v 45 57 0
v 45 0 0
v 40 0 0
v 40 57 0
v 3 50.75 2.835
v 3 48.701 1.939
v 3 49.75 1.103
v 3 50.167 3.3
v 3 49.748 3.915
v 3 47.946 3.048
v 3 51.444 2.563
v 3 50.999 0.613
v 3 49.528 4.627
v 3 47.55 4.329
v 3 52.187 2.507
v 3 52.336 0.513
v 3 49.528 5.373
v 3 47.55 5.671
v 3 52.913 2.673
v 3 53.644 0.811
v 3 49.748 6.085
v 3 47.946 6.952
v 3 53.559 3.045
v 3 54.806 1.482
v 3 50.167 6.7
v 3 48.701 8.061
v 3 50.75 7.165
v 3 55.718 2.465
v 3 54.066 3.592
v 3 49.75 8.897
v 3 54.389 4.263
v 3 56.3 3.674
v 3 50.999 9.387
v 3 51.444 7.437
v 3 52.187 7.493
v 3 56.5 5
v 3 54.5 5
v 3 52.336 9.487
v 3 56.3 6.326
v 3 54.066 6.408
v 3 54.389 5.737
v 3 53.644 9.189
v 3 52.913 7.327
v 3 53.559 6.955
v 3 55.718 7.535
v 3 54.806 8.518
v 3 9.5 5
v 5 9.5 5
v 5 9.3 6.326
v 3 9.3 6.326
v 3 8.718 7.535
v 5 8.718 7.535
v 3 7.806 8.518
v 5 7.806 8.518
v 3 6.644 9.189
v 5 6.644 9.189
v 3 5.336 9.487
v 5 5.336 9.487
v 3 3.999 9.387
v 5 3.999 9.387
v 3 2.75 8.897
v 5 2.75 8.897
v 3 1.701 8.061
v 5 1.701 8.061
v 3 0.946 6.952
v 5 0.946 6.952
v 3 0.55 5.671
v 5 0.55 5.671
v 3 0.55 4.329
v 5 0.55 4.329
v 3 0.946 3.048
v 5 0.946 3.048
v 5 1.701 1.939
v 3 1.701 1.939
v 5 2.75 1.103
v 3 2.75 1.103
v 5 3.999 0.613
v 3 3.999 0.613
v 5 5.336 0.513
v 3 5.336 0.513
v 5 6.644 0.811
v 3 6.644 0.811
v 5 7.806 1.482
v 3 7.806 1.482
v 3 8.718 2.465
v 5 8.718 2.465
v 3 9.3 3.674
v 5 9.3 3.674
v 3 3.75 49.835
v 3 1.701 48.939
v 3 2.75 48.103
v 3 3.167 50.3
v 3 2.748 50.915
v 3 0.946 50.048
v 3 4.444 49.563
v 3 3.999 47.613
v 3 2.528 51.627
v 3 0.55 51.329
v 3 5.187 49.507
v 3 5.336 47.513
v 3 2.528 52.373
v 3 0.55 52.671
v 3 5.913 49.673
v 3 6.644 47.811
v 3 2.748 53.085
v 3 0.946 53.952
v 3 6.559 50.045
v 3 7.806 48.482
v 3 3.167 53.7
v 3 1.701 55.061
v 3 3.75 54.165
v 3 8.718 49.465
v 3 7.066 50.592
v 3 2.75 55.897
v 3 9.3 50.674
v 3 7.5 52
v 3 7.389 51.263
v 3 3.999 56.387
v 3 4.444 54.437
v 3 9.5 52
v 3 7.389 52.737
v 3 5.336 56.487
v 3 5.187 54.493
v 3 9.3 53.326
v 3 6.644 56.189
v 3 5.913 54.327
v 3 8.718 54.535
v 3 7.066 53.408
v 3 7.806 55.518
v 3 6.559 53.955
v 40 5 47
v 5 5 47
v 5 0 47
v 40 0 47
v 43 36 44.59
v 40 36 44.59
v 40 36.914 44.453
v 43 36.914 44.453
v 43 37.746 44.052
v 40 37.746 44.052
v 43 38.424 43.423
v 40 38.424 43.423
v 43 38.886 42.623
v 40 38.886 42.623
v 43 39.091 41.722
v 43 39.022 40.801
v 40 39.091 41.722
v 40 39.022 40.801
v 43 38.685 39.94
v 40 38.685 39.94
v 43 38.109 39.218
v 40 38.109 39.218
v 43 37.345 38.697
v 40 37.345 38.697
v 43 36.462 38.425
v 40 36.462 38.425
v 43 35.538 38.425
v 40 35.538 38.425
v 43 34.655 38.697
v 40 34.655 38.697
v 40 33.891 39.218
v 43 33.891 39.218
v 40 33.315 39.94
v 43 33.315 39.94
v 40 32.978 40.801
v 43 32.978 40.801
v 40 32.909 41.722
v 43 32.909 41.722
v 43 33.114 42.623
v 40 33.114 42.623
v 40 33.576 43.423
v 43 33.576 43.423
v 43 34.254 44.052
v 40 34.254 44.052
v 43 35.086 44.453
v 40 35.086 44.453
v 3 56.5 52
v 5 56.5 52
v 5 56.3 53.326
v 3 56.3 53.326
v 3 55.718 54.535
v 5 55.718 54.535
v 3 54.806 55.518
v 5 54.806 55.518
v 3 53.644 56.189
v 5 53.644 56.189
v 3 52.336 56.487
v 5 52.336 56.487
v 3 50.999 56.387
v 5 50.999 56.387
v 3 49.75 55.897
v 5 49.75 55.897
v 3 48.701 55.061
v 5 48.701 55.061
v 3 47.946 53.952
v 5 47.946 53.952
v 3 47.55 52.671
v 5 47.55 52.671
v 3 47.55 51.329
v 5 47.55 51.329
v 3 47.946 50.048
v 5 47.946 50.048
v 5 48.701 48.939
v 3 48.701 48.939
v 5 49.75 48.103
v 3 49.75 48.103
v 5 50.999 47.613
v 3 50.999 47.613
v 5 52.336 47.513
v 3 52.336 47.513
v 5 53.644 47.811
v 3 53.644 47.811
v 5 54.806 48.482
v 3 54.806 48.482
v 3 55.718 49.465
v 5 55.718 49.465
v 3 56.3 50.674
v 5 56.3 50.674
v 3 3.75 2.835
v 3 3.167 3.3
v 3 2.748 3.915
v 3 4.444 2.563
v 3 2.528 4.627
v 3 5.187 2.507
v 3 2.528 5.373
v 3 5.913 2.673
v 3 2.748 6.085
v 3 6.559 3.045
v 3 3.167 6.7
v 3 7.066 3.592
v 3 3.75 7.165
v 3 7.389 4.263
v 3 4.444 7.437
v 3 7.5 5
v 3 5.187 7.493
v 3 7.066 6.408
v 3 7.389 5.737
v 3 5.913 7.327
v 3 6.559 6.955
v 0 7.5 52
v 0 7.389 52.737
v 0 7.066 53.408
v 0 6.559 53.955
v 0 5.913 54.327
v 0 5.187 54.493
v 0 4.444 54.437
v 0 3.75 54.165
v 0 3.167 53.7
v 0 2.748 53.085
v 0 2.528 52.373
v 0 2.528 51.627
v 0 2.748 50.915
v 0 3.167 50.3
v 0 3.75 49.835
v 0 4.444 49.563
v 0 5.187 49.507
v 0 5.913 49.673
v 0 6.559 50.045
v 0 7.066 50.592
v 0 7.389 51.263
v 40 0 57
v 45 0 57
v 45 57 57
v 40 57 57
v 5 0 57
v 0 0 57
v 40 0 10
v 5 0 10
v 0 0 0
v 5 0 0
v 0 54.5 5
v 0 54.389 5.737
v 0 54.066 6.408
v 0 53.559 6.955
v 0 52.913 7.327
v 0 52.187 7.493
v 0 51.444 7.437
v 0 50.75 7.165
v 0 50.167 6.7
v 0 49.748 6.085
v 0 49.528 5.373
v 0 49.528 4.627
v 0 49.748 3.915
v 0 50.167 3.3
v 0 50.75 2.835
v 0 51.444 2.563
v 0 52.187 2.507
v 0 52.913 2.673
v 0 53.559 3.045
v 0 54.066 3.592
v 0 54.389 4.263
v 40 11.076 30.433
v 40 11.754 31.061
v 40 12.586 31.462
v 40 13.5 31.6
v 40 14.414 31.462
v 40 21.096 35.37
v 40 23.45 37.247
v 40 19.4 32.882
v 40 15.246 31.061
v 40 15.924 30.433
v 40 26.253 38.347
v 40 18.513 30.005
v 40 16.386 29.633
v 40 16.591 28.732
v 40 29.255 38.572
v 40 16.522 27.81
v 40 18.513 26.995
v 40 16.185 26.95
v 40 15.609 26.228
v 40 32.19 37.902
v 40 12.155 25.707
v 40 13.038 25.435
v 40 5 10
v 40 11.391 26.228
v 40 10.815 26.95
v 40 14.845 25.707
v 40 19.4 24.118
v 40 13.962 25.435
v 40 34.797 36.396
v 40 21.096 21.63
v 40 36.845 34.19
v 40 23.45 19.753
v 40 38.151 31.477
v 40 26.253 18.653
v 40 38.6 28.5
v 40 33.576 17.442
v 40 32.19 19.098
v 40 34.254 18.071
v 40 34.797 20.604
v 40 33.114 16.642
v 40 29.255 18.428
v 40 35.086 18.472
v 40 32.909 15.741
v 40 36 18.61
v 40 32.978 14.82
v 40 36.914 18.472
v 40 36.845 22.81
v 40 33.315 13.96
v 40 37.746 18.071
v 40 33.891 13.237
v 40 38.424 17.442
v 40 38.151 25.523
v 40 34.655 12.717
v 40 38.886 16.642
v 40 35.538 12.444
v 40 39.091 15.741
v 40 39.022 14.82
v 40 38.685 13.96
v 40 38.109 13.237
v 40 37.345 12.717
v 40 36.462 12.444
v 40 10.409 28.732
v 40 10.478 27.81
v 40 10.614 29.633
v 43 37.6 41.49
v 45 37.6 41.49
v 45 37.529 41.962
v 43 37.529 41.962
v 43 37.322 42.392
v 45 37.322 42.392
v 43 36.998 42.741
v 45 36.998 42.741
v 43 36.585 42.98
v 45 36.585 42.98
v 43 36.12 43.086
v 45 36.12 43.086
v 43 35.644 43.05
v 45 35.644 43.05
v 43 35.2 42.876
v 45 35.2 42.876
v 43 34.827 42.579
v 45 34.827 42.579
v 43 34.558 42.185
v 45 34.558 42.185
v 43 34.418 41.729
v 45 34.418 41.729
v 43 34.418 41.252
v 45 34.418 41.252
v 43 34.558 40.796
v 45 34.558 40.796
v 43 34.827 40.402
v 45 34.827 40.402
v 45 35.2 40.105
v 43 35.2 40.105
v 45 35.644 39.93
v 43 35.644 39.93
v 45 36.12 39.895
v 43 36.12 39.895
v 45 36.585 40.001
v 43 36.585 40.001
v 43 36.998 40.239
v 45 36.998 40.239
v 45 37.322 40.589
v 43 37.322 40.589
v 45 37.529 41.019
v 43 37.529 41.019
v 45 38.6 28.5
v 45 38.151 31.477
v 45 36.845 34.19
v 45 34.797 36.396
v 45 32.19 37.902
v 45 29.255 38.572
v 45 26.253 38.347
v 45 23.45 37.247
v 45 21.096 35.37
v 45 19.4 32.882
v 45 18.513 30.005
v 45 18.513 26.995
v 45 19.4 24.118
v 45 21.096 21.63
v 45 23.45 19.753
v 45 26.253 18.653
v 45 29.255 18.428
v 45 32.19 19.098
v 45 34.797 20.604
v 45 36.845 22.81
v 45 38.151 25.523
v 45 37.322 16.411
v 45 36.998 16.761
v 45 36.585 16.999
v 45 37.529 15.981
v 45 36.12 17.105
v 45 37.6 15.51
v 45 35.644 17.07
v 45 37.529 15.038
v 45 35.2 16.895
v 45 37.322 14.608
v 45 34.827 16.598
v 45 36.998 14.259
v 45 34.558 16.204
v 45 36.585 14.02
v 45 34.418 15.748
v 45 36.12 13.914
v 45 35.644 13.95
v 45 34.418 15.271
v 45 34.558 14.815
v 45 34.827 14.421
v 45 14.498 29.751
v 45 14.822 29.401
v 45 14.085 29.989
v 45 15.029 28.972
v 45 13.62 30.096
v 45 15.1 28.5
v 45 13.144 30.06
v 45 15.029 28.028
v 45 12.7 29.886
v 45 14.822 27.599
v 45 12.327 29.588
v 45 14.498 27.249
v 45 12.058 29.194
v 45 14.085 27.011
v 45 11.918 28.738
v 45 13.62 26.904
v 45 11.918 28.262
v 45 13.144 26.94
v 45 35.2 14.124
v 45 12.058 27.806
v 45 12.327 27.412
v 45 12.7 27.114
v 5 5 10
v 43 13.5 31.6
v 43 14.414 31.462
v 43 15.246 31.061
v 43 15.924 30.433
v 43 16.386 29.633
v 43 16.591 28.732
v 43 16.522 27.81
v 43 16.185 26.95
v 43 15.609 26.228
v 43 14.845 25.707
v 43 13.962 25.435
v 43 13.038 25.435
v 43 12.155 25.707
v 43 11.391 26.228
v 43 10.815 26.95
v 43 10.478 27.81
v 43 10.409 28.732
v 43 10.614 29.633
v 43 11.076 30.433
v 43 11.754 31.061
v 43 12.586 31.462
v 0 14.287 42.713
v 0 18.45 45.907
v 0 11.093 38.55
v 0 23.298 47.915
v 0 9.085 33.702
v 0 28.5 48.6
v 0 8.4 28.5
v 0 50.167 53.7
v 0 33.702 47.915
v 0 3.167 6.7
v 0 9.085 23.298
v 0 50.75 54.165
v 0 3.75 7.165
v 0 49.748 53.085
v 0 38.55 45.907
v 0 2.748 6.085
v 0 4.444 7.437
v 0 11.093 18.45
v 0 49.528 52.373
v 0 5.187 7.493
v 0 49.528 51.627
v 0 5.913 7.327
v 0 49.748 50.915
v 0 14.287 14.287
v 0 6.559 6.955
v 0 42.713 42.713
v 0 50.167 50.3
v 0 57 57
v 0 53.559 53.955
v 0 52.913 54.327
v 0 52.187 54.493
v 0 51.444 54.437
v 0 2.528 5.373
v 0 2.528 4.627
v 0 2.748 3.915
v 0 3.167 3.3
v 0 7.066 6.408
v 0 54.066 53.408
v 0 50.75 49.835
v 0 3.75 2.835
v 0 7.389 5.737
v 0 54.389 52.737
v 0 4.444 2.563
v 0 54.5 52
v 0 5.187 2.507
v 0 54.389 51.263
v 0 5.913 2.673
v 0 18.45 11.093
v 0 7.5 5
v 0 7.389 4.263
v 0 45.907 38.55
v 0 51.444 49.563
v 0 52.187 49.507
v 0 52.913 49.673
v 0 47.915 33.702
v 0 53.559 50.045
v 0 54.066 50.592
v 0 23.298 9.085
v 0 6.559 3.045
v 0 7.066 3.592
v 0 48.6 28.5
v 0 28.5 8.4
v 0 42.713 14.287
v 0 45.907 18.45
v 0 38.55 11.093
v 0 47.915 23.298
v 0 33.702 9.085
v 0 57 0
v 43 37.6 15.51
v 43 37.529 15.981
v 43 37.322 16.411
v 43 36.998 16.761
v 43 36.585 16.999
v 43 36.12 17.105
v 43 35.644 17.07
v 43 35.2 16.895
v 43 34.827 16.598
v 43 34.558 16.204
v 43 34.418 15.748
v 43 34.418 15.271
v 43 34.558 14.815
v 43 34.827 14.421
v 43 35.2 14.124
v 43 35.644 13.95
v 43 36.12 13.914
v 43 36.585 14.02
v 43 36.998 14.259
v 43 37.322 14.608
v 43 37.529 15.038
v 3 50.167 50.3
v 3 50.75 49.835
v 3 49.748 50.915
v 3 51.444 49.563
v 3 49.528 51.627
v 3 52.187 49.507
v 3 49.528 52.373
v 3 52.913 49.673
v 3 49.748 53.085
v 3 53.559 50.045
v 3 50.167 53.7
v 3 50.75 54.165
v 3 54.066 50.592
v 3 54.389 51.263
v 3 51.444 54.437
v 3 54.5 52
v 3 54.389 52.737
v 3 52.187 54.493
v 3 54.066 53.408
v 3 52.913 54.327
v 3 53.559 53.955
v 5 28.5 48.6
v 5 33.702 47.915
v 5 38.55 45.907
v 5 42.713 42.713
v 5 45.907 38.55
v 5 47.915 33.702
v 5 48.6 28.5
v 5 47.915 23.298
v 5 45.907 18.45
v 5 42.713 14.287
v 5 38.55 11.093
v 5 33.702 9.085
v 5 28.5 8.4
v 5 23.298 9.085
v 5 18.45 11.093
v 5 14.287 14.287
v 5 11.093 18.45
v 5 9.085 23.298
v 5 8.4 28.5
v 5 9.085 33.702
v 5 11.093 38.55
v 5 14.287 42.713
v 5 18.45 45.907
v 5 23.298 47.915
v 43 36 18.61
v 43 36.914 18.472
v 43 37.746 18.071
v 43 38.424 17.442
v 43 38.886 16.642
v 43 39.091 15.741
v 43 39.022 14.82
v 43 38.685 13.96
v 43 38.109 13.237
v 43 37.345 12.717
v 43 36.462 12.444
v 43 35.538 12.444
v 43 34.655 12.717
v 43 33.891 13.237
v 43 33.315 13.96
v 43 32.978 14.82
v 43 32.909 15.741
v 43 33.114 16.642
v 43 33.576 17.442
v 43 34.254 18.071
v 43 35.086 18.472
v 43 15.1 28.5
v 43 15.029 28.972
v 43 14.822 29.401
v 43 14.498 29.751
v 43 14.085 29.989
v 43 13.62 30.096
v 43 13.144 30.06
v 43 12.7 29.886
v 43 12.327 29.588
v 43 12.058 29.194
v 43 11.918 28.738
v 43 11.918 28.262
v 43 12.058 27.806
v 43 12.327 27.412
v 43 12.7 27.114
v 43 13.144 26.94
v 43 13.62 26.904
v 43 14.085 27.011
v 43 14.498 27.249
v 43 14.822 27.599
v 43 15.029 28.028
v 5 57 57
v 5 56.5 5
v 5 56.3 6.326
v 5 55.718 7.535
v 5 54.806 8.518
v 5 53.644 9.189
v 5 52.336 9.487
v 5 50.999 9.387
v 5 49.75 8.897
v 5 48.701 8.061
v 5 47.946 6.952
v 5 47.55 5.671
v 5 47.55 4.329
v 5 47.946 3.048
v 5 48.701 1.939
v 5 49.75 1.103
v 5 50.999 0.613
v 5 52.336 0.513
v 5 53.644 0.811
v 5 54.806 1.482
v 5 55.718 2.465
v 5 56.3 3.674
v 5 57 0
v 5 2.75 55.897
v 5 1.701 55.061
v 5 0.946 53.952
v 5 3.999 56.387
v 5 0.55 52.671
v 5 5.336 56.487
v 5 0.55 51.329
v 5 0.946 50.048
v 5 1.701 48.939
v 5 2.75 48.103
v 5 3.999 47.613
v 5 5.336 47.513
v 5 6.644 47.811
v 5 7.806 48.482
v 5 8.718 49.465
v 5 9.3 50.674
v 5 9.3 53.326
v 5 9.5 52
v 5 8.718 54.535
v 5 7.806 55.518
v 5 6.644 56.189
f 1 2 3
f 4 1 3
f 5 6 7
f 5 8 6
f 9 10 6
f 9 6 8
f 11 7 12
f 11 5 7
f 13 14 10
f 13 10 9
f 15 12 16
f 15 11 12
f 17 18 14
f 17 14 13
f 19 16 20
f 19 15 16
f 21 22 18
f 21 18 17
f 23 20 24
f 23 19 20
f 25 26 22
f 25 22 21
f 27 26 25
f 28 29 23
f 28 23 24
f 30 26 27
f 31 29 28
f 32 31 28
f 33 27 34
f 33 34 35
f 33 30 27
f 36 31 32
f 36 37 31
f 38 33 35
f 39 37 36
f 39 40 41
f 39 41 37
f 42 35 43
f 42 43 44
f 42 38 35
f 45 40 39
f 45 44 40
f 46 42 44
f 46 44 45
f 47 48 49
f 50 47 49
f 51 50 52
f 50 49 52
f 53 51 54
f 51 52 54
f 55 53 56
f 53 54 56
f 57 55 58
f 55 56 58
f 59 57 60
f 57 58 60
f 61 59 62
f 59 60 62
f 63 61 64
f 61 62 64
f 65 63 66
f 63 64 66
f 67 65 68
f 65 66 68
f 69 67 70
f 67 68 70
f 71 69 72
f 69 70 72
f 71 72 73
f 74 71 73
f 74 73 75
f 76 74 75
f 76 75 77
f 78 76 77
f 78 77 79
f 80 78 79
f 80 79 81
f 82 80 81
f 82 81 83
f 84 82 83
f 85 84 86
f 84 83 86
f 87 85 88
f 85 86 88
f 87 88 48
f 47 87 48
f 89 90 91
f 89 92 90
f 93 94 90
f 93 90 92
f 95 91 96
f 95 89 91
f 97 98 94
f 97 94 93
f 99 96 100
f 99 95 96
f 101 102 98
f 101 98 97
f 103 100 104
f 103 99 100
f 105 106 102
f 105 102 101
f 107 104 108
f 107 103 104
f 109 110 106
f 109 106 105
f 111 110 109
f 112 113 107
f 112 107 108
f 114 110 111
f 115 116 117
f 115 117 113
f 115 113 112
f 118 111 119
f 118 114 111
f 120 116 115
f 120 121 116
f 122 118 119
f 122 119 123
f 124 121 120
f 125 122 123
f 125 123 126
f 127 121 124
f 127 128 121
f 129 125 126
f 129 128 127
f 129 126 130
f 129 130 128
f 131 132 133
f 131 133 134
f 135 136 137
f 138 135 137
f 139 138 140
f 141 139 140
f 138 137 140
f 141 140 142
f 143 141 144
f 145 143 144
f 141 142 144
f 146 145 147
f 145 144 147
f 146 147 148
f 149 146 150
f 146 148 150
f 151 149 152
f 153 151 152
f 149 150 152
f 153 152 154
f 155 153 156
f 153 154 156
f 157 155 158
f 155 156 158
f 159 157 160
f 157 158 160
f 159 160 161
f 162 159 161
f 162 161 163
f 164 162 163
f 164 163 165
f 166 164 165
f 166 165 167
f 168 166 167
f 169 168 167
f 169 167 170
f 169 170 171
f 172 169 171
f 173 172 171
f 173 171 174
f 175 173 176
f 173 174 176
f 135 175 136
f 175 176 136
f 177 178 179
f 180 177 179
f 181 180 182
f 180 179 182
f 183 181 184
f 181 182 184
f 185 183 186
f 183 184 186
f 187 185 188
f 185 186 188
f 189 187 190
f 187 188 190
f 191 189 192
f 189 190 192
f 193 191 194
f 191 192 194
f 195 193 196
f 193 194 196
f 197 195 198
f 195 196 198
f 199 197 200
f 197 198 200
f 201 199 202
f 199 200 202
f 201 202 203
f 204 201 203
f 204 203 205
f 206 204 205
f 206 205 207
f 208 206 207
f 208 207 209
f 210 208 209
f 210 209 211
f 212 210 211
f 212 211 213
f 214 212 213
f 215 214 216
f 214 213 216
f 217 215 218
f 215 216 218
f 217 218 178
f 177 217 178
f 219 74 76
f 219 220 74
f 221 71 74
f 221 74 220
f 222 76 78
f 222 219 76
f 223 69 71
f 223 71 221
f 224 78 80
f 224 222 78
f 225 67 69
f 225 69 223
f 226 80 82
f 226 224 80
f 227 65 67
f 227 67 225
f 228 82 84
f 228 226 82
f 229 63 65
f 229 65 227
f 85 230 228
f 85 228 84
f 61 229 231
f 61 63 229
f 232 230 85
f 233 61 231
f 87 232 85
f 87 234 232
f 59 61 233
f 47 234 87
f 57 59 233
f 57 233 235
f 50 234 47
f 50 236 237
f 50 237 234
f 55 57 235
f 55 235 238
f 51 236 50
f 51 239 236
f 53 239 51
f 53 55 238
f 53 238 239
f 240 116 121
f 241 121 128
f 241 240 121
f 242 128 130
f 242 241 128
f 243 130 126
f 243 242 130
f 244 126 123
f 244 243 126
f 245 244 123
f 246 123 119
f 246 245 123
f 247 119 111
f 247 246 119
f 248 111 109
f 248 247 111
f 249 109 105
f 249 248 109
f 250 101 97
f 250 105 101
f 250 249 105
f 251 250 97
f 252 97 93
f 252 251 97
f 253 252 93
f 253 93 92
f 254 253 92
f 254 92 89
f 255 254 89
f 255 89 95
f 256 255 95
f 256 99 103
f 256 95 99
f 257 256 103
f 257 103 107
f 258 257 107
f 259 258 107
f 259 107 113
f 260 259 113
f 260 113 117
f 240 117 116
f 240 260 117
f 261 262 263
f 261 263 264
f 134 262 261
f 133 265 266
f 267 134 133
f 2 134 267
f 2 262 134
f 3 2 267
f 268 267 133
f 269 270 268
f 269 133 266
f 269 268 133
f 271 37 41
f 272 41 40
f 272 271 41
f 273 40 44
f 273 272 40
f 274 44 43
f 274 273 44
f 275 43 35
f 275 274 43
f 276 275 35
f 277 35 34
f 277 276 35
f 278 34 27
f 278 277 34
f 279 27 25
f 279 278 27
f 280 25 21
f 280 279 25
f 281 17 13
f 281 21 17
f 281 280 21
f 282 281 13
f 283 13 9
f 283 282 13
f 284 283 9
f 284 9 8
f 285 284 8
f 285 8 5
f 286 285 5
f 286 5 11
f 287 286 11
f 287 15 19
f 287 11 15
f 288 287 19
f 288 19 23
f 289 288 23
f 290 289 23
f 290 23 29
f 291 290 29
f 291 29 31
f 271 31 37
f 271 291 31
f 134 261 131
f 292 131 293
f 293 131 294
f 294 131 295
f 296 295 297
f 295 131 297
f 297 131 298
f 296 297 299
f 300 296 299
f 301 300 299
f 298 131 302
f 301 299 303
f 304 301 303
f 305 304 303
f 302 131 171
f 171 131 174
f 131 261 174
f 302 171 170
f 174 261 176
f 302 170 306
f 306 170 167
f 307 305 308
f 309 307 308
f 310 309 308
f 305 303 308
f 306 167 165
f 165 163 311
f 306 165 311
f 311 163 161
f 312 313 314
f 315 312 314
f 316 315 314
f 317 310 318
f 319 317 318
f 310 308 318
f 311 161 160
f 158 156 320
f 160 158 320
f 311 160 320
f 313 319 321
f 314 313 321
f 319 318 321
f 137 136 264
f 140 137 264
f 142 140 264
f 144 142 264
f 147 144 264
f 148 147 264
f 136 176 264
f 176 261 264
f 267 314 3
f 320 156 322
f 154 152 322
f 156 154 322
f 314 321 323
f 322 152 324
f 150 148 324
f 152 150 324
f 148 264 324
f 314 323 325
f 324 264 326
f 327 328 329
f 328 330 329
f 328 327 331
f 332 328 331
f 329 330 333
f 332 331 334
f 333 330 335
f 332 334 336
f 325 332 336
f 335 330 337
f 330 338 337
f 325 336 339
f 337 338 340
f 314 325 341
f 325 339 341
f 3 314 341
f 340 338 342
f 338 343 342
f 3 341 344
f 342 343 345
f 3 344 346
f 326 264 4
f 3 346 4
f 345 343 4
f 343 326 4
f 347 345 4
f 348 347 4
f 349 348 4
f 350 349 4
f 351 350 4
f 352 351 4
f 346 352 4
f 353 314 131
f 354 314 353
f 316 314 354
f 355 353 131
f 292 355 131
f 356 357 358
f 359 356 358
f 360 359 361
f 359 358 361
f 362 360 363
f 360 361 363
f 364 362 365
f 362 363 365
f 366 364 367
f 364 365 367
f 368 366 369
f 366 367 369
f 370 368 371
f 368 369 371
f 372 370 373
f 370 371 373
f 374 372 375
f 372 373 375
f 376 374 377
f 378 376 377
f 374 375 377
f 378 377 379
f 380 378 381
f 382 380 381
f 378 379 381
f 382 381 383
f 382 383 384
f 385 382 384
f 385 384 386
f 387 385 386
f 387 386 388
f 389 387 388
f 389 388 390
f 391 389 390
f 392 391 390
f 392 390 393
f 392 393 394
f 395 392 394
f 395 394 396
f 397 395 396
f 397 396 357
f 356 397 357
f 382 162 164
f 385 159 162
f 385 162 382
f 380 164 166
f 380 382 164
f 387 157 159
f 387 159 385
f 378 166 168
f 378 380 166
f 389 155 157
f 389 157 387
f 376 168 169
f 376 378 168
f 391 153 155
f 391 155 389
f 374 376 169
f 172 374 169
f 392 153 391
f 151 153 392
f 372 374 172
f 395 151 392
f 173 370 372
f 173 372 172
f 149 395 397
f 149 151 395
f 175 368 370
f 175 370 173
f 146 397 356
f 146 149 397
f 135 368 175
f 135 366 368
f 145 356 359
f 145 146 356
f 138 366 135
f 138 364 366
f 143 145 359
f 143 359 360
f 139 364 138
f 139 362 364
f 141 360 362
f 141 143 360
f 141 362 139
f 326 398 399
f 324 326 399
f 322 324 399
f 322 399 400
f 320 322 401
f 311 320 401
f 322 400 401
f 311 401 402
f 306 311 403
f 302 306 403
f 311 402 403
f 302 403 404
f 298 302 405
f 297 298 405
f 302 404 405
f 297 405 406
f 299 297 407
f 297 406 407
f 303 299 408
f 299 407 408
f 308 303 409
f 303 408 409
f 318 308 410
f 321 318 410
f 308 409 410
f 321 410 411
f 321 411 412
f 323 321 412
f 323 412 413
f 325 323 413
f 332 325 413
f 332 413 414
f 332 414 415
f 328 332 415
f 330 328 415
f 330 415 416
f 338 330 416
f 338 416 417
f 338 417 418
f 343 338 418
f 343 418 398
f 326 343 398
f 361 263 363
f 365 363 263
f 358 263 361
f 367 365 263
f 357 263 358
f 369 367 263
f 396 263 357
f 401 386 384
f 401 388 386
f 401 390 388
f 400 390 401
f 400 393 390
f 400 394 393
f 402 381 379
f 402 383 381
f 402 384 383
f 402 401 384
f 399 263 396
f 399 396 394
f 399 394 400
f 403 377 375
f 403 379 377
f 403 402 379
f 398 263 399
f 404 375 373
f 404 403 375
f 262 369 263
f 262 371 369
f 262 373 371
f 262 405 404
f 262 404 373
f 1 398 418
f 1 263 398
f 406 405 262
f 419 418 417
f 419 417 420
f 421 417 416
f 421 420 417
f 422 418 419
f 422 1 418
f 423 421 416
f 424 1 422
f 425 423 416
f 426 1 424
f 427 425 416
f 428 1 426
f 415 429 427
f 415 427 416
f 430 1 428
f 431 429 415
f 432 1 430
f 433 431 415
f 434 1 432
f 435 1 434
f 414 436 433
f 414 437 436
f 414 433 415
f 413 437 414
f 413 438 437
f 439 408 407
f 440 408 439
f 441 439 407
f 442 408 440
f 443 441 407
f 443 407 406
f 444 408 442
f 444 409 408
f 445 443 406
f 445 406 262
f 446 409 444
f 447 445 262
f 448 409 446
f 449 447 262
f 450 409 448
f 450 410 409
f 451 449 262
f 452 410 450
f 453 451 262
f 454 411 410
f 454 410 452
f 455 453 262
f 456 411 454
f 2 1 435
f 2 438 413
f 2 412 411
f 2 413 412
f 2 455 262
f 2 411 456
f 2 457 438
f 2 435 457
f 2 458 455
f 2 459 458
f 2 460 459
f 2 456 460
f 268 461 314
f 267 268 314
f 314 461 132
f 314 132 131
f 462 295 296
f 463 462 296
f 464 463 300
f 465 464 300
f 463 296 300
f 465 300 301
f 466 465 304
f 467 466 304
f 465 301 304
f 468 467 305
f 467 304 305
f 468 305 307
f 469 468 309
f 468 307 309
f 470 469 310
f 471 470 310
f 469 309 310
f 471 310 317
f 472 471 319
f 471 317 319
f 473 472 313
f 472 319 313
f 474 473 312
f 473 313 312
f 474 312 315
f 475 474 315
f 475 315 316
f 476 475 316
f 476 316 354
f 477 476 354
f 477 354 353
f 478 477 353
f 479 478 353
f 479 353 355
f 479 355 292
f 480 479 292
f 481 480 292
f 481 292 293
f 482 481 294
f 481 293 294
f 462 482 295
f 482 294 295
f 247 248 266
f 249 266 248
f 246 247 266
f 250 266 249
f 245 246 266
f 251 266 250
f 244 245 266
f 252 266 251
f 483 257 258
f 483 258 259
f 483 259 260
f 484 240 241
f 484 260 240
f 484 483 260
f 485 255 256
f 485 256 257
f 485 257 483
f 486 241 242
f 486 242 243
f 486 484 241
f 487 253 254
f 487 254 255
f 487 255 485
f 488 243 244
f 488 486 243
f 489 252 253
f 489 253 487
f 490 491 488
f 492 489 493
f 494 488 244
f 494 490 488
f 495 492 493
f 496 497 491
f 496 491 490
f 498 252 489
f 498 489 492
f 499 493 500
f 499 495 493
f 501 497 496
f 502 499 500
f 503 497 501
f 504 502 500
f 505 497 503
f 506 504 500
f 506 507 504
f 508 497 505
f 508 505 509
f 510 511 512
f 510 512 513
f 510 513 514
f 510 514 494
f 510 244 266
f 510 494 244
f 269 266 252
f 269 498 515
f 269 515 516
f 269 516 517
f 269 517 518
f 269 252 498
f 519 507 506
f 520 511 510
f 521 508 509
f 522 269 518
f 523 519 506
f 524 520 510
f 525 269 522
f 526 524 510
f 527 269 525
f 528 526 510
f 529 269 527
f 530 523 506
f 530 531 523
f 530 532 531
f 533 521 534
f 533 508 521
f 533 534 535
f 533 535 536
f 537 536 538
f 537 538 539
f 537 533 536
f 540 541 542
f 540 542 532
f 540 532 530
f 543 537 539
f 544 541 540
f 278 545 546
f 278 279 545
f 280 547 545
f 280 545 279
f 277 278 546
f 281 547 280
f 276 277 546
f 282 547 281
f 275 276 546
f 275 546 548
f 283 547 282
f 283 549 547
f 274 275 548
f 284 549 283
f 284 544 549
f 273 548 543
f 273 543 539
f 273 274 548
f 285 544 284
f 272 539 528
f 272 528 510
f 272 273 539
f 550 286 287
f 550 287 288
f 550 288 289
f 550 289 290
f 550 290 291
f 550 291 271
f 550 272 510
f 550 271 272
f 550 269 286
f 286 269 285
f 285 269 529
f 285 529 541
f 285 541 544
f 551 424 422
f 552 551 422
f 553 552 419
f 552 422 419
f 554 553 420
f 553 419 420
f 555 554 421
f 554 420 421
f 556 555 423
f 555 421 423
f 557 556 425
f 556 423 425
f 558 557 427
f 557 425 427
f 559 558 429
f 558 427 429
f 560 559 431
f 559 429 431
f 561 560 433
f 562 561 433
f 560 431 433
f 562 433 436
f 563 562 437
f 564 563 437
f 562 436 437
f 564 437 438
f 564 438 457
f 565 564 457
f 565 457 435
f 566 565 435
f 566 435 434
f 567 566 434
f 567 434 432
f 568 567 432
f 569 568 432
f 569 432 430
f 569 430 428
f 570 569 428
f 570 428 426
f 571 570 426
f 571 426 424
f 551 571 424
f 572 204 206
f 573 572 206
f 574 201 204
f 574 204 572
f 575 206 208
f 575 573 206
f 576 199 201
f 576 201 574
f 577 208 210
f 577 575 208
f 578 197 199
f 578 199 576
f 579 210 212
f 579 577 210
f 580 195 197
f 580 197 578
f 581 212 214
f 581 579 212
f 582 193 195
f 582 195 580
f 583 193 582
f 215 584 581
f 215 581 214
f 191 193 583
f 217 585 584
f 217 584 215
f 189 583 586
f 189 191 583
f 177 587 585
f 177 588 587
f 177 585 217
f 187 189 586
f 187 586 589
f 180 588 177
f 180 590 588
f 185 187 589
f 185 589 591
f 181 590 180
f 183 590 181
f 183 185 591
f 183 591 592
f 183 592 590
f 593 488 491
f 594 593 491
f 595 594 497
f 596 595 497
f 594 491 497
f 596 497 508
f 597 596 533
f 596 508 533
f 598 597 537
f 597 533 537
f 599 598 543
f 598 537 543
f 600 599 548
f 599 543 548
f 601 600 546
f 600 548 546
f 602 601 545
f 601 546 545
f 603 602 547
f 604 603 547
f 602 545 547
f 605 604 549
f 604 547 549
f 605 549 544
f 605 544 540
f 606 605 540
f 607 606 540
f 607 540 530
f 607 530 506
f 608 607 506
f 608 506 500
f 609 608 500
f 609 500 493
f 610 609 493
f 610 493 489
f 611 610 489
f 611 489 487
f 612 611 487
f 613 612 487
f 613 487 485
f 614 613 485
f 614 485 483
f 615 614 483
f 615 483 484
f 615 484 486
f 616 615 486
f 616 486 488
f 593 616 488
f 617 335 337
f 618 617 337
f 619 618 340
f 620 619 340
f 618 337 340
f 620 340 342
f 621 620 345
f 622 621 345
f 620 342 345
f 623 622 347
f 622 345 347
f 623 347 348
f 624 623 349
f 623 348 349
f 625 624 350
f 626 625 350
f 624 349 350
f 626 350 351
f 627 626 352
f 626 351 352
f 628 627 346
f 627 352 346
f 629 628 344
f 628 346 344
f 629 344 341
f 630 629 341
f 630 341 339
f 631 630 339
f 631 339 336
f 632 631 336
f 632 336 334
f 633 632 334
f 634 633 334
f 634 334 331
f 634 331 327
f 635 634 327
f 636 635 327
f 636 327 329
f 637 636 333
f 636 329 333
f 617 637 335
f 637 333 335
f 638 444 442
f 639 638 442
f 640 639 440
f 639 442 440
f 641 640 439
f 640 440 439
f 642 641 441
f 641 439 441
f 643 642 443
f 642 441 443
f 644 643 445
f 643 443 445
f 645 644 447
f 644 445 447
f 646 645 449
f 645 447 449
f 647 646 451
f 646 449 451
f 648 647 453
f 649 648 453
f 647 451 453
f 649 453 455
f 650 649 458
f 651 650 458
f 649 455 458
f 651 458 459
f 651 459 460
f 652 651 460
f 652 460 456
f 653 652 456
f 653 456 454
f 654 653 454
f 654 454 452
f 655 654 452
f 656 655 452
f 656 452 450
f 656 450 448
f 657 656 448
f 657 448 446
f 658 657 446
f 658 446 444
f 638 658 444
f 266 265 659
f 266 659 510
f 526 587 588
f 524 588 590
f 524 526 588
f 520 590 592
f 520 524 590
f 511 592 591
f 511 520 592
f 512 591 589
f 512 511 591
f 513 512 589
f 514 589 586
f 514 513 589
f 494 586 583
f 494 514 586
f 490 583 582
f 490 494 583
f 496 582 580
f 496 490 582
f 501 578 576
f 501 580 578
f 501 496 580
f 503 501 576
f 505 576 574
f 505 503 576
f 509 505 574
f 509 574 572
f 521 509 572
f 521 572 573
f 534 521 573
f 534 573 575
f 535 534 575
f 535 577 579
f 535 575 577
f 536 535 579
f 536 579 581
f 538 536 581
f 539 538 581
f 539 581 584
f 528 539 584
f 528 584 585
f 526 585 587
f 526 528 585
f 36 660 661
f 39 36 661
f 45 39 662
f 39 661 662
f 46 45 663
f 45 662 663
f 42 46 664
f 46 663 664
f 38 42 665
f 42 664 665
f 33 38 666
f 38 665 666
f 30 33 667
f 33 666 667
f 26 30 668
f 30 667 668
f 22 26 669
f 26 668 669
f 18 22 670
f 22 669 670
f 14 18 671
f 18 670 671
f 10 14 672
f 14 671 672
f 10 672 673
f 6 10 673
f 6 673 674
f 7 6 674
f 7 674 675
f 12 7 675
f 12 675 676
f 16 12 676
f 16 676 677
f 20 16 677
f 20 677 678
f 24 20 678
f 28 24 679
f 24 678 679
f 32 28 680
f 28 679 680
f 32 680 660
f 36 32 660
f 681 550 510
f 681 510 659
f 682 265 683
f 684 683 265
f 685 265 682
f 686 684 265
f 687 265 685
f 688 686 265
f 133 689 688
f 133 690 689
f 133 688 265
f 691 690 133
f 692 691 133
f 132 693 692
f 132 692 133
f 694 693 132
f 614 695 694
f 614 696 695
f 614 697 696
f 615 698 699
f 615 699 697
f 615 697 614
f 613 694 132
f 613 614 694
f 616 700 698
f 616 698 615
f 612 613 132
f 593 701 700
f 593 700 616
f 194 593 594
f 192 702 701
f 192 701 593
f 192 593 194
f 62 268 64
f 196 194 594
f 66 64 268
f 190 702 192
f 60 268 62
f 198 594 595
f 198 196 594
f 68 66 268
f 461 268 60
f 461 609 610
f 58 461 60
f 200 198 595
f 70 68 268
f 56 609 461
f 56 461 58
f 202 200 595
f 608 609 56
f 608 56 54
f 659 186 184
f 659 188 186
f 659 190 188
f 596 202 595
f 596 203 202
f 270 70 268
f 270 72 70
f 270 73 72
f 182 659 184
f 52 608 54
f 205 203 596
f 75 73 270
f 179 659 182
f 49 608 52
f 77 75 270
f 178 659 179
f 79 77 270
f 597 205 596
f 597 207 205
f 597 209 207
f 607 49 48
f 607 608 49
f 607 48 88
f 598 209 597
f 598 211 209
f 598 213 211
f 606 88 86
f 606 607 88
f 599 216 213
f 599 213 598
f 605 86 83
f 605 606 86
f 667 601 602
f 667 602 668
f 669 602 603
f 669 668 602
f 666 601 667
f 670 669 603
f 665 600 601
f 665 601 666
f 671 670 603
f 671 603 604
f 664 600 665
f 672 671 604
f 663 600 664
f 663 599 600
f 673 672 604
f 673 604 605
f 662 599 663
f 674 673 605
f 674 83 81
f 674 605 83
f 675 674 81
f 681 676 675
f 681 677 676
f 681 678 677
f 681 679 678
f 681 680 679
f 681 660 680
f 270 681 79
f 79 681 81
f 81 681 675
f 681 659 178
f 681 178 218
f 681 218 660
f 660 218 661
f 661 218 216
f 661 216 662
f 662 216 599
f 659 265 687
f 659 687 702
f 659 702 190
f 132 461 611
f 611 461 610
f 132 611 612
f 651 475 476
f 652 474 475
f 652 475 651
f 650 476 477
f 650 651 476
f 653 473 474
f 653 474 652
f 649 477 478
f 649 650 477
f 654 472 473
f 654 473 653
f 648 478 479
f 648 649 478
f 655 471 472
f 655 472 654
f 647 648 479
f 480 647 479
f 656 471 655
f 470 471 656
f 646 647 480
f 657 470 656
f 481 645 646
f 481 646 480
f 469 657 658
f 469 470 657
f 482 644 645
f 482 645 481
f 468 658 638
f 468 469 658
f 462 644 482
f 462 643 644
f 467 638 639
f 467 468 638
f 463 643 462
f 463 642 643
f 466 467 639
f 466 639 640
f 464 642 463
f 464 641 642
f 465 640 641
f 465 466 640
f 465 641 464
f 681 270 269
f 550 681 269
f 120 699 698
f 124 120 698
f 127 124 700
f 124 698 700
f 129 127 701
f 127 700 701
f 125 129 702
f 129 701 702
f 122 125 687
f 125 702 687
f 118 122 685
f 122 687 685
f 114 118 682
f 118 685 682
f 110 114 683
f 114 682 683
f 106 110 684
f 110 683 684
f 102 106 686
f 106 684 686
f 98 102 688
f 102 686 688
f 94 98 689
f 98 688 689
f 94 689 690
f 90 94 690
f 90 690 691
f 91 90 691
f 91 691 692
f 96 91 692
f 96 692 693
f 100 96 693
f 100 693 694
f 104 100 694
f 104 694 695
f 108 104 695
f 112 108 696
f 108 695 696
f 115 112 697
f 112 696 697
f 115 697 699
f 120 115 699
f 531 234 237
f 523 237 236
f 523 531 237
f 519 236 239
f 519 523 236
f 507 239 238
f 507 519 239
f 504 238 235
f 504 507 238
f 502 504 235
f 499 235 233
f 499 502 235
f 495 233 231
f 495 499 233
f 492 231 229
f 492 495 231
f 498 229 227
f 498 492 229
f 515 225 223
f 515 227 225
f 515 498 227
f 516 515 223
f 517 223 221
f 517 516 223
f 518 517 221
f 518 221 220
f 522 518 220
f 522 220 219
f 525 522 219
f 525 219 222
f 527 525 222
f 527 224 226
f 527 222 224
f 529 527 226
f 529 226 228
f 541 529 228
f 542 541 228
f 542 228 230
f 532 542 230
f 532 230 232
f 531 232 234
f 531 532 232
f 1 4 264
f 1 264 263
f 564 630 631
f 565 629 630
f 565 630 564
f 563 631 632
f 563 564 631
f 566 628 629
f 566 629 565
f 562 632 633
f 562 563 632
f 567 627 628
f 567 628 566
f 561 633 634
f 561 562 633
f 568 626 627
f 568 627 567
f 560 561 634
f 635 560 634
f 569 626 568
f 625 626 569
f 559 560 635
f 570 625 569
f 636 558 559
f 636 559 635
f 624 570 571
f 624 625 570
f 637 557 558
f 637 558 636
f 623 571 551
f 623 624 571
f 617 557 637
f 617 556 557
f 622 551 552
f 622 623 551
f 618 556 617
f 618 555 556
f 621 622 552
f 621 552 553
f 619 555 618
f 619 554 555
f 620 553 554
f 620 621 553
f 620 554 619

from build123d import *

# Parameters (mm, degrees)
EXTRUDE_1_DEPTH      = 57
SKETCH_2_W           = 35
SKETCH_2_H           = 10
CUT_EXTRUDE_1_DEPTH  = 90.319650693
CUT_EXTRUDE_2_REACH  = 94.32
SKETCH_3_R           = 20.1
SKETCH_4_R           = 4.5
CUT_EXTRUDE_6_DEPTH  = 2
CUT_EXTRUDE_7_REACH  = 94.32
SKETCH_5_R           = 2.5
CUT_EXTRUDE_8_REACH  = 94.32
SKETCH_9_R           = 10.1
CUT_EXTRUDE_9_REACH  = 94.32
SKETCH_1786_R        = 1.6
SKETCH_12_R          = 3.1
CUT_EXTRUDE_10_DEPTH = 3


with BuildPart() as part:
    # 草图1 → 凸台-拉伸1 (new body)
    with BuildSketch(Plane.XY):
        Polygon((0, 0), (0, 57), (5, 57), (5, 5), (40, 5), (40, 57), (45, 57), (45, 0), align=None)
    extrude(amount=EXTRUDE_1_DEPTH)

    # 草图2 → 切除-拉伸1 (cut, through all)
    with BuildSketch(Plane(origin=(0, 5, 0), x_dir=(1, 0, 0), z_dir=(0, 1, 0))):
        with Locations((22.5, -52)):
            Rectangle(SKETCH_2_W, SKETCH_2_H)
        with Locations((22.5, -5)):
            Rectangle(SKETCH_2_W, SKETCH_2_H)
    extrude(amount=-CUT_EXTRUDE_1_DEPTH, mode=Mode.SUBTRACT)

    # 草图3 → 切除-拉伸2 (cut, up to next)
    with BuildSketch(Plane.ZY, mode=Mode.PRIVATE) as cut_extrude_2_sk1:
        with Locations((28.5, 28.5)):
            Circle(SKETCH_3_R)
    cut_extrude_2_tool1 = extrude(cut_extrude_2_sk1.sketch, amount=-CUT_EXTRUDE_2_REACH, mode=Mode.PRIVATE) & part.part
    add(cut_extrude_2_tool1.solids().sort_by_distance((0, 28.5, 28.5))[0], mode=Mode.SUBTRACT)

    # 草图4 → 切除-拉伸6 (cut)
    with BuildSketch(Plane(origin=(5, 0, 0), x_dir=(0, 0, -1), z_dir=(1, 0, 0))):
        with Locations(Location((-52, 52, 0), (0, 0, 90))):
            Circle(SKETCH_4_R)
        with Locations(Location((-5, 52, 0), (0, 0, 90))):
            Circle(SKETCH_4_R)
        with Locations(Location((-5, 5, 0), (0, 0, 90))):
            Circle(SKETCH_4_R)
        with Locations(Location((-52, 5, 0), (0, 0, 90))):
            Circle(SKETCH_4_R)
    extrude(amount=-CUT_EXTRUDE_6_DEPTH, mode=Mode.SUBTRACT)

    # 草图5 → 切除-拉伸7 (cut, up to next)
    with BuildSketch(Plane(origin=(0, 0, 0), x_dir=(0, 0, -1), z_dir=(1, 0, 0)), mode=Mode.PRIVATE) as cut_extrude_7_sk1:
        with Locations(Location((-52, 52, 0), (0, 0, 90))):
            Circle(SKETCH_5_R)
    cut_extrude_7_tool1 = extrude(cut_extrude_7_sk1.sketch, amount=CUT_EXTRUDE_7_REACH, mode=Mode.PRIVATE) & part.part
    # 草图5 → 切除-拉伸7 (cut, up to next)
    with BuildSketch(Plane(origin=(0, 0, 0), x_dir=(0, 0, -1), z_dir=(1, 0, 0)), mode=Mode.PRIVATE) as cut_extrude_7_sk2:
        with Locations(Location((-5, 52, 0), (0, 0, 90))):
            Circle(SKETCH_5_R)
    cut_extrude_7_tool2 = extrude(cut_extrude_7_sk2.sketch, amount=CUT_EXTRUDE_7_REACH, mode=Mode.PRIVATE) & part.part
    # 草图5 → 切除-拉伸7 (cut, up to next)
    with BuildSketch(Plane(origin=(0, 0, 0), x_dir=(0, 0, -1), z_dir=(1, 0, 0)), mode=Mode.PRIVATE) as cut_extrude_7_sk3:
        with Locations(Location((-5, 5, 0), (0, 0, 90))):
            Circle(SKETCH_5_R)
    cut_extrude_7_tool3 = extrude(cut_extrude_7_sk3.sketch, amount=CUT_EXTRUDE_7_REACH, mode=Mode.PRIVATE) & part.part
    # 草图5 → 切除-拉伸7 (cut, up to next)
    with BuildSketch(Plane(origin=(0, 0, 0), x_dir=(0, 0, -1), z_dir=(1, 0, 0)), mode=Mode.PRIVATE) as cut_extrude_7_sk4:
        with Locations(Location((-52, 5, 0), (0, 0, 90))):
            Circle(SKETCH_5_R)
    cut_extrude_7_tool4 = extrude(cut_extrude_7_sk4.sketch, amount=CUT_EXTRUDE_7_REACH, mode=Mode.PRIVATE) & part.part
    add(cut_extrude_7_tool1.solids().sort_by_distance((0, 52, 52))[0], mode=Mode.SUBTRACT)
    add(cut_extrude_7_tool2.solids().sort_by_distance((0, 52, 5))[0], mode=Mode.SUBTRACT)
    add(cut_extrude_7_tool3.solids().sort_by_distance((0, 5, 5))[0], mode=Mode.SUBTRACT)
    add(cut_extrude_7_tool4.solids().sort_by_distance((0, 5, 52))[0], mode=Mode.SUBTRACT)

    # 草图9 → 切除-拉伸8 (cut, up to next)
    with BuildSketch(Plane(origin=(45, 0, 0), x_dir=(0, 0, -1), z_dir=(1, 0, 0)), mode=Mode.PRIVATE) as cut_extrude_8_sk1:
        with Locations(Location((-28.5, 28.5, 0), (0, 0, 90))):
            Circle(SKETCH_9_R)
    cut_extrude_8_tool1 = extrude(cut_extrude_8_sk1.sketch, amount=-CUT_EXTRUDE_8_REACH, mode=Mode.PRIVATE) & part.part
    add(cut_extrude_8_tool1.solids().sort_by_distance((45, 28.5, 28.5))[0], mode=Mode.SUBTRACT)

    # Sketch 1786 → 切除-拉伸9 (cut, up to next)
    with BuildSketch(Plane(origin=(45, 0, 0), x_dir=(0, 0, -1), z_dir=(1, 0, 0)), mode=Mode.PRIVATE) as cut_extrude_9_sk1:
        with Locations(Location((-28.5, 13.5, 0), (0, 0, 90))):
            Circle(SKETCH_1786_R)
    cut_extrude_9_tool1 = extrude(cut_extrude_9_sk1.sketch, amount=-CUT_EXTRUDE_9_REACH, mode=Mode.PRIVATE) & part.part
    # Sketch 1786 → 切除-拉伸9 (cut, up to next)
    with BuildSketch(Plane(origin=(45, 0, 0), x_dir=(0, 0, -1), z_dir=(1, 0, 0)), mode=Mode.PRIVATE) as cut_extrude_9_sk2:
        with Locations(Location((-41.490381057, 36, 0), (0, 0, 90))):
            Circle(SKETCH_1786_R)
    cut_extrude_9_tool2 = extrude(cut_extrude_9_sk2.sketch, amount=-CUT_EXTRUDE_9_REACH, mode=Mode.PRIVATE) & part.part
    # Sketch 1786 → 切除-拉伸9 (cut, up to next)
    with BuildSketch(Plane(origin=(45, 0, 0), x_dir=(0, 0, -1), z_dir=(1, 0, 0)), mode=Mode.PRIVATE) as cut_extrude_9_sk3:
        with Locations(Location((-15.509618943, 36, 0), (0, 0, 90))):
            Circle(SKETCH_1786_R)
    cut_extrude_9_tool3 = extrude(cut_extrude_9_sk3.sketch, amount=-CUT_EXTRUDE_9_REACH, mode=Mode.PRIVATE) & part.part
    add(cut_extrude_9_tool1.solids().sort_by_distance((45, 13.5, 28.5))[0], mode=Mode.SUBTRACT)
    add(cut_extrude_9_tool2.solids().sort_by_distance((45, 36, 41.490381))[0], mode=Mode.SUBTRACT)
    add(cut_extrude_9_tool3.solids().sort_by_distance((45, 36, 15.509619))[0], mode=Mode.SUBTRACT)

    # 草图12 → 切除-拉伸10 (cut)
    with BuildSketch(Plane.ZY.offset(-40)):
        with Locations((28.5, 13.5)):
            Circle(SKETCH_12_R)
        with Locations((15.509618943, 36)):
            Circle(SKETCH_12_R)
        with Locations((41.490381057, 36)):
            Circle(SKETCH_12_R)
    extrude(amount=-CUT_EXTRUDE_10_DEPTH, mode=Mode.SUBTRACT)


solid = part.part
